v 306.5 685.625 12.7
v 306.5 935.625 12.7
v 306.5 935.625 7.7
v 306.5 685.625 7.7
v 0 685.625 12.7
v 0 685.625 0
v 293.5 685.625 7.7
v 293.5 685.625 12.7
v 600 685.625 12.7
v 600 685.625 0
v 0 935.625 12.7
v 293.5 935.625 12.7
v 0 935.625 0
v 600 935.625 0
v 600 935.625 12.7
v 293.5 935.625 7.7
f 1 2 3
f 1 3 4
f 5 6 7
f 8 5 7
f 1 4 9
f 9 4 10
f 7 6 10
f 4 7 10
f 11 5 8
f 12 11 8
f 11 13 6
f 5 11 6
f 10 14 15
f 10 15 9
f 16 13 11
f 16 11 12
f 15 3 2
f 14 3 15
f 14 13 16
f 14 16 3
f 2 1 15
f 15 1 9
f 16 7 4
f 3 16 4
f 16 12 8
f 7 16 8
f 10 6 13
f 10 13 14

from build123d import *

# Parameters (mm, degrees)
SKETCH002_W     = 600
SKETCH002_H     = 250
PAD002_DEPTH    = 12.7
SKETCH008_W     = 13
SKETCH008_H     = 264.944031
POCKET002_DEPTH = 5


with BuildPart() as bottom:
    # Sketch002 → Pad002 (new body)
    with BuildSketch(Plane.XY):
        with Locations((300, 541.24469)):
            Rectangle(SKETCH002_W, SKETCH002_H)
    extrude(amount=PAD002_DEPTH)

    # Sketch008 (on Face6 of Pad002) → Pocket002 (cut)
    with BuildSketch(Plane.XY.offset(12.7)):
        with Locations((300, 543.505463)):
            Rectangle(SKETCH008_W, SKETCH008_H)
    extrude(amount=-POCKET002_DEPTH, mode=Mode.SUBTRACT)


with BuildPart() as model_bottom_mirrored:
    # Mirror002: instance of Bottom
    add(bottom.part.mirror(Plane(origin=(-4.230286, 675.934937, 0), x_dir=(-1, 0, 0), z_dir=(0, -1, 0))))


solid = model_bottom_mirrored.part
